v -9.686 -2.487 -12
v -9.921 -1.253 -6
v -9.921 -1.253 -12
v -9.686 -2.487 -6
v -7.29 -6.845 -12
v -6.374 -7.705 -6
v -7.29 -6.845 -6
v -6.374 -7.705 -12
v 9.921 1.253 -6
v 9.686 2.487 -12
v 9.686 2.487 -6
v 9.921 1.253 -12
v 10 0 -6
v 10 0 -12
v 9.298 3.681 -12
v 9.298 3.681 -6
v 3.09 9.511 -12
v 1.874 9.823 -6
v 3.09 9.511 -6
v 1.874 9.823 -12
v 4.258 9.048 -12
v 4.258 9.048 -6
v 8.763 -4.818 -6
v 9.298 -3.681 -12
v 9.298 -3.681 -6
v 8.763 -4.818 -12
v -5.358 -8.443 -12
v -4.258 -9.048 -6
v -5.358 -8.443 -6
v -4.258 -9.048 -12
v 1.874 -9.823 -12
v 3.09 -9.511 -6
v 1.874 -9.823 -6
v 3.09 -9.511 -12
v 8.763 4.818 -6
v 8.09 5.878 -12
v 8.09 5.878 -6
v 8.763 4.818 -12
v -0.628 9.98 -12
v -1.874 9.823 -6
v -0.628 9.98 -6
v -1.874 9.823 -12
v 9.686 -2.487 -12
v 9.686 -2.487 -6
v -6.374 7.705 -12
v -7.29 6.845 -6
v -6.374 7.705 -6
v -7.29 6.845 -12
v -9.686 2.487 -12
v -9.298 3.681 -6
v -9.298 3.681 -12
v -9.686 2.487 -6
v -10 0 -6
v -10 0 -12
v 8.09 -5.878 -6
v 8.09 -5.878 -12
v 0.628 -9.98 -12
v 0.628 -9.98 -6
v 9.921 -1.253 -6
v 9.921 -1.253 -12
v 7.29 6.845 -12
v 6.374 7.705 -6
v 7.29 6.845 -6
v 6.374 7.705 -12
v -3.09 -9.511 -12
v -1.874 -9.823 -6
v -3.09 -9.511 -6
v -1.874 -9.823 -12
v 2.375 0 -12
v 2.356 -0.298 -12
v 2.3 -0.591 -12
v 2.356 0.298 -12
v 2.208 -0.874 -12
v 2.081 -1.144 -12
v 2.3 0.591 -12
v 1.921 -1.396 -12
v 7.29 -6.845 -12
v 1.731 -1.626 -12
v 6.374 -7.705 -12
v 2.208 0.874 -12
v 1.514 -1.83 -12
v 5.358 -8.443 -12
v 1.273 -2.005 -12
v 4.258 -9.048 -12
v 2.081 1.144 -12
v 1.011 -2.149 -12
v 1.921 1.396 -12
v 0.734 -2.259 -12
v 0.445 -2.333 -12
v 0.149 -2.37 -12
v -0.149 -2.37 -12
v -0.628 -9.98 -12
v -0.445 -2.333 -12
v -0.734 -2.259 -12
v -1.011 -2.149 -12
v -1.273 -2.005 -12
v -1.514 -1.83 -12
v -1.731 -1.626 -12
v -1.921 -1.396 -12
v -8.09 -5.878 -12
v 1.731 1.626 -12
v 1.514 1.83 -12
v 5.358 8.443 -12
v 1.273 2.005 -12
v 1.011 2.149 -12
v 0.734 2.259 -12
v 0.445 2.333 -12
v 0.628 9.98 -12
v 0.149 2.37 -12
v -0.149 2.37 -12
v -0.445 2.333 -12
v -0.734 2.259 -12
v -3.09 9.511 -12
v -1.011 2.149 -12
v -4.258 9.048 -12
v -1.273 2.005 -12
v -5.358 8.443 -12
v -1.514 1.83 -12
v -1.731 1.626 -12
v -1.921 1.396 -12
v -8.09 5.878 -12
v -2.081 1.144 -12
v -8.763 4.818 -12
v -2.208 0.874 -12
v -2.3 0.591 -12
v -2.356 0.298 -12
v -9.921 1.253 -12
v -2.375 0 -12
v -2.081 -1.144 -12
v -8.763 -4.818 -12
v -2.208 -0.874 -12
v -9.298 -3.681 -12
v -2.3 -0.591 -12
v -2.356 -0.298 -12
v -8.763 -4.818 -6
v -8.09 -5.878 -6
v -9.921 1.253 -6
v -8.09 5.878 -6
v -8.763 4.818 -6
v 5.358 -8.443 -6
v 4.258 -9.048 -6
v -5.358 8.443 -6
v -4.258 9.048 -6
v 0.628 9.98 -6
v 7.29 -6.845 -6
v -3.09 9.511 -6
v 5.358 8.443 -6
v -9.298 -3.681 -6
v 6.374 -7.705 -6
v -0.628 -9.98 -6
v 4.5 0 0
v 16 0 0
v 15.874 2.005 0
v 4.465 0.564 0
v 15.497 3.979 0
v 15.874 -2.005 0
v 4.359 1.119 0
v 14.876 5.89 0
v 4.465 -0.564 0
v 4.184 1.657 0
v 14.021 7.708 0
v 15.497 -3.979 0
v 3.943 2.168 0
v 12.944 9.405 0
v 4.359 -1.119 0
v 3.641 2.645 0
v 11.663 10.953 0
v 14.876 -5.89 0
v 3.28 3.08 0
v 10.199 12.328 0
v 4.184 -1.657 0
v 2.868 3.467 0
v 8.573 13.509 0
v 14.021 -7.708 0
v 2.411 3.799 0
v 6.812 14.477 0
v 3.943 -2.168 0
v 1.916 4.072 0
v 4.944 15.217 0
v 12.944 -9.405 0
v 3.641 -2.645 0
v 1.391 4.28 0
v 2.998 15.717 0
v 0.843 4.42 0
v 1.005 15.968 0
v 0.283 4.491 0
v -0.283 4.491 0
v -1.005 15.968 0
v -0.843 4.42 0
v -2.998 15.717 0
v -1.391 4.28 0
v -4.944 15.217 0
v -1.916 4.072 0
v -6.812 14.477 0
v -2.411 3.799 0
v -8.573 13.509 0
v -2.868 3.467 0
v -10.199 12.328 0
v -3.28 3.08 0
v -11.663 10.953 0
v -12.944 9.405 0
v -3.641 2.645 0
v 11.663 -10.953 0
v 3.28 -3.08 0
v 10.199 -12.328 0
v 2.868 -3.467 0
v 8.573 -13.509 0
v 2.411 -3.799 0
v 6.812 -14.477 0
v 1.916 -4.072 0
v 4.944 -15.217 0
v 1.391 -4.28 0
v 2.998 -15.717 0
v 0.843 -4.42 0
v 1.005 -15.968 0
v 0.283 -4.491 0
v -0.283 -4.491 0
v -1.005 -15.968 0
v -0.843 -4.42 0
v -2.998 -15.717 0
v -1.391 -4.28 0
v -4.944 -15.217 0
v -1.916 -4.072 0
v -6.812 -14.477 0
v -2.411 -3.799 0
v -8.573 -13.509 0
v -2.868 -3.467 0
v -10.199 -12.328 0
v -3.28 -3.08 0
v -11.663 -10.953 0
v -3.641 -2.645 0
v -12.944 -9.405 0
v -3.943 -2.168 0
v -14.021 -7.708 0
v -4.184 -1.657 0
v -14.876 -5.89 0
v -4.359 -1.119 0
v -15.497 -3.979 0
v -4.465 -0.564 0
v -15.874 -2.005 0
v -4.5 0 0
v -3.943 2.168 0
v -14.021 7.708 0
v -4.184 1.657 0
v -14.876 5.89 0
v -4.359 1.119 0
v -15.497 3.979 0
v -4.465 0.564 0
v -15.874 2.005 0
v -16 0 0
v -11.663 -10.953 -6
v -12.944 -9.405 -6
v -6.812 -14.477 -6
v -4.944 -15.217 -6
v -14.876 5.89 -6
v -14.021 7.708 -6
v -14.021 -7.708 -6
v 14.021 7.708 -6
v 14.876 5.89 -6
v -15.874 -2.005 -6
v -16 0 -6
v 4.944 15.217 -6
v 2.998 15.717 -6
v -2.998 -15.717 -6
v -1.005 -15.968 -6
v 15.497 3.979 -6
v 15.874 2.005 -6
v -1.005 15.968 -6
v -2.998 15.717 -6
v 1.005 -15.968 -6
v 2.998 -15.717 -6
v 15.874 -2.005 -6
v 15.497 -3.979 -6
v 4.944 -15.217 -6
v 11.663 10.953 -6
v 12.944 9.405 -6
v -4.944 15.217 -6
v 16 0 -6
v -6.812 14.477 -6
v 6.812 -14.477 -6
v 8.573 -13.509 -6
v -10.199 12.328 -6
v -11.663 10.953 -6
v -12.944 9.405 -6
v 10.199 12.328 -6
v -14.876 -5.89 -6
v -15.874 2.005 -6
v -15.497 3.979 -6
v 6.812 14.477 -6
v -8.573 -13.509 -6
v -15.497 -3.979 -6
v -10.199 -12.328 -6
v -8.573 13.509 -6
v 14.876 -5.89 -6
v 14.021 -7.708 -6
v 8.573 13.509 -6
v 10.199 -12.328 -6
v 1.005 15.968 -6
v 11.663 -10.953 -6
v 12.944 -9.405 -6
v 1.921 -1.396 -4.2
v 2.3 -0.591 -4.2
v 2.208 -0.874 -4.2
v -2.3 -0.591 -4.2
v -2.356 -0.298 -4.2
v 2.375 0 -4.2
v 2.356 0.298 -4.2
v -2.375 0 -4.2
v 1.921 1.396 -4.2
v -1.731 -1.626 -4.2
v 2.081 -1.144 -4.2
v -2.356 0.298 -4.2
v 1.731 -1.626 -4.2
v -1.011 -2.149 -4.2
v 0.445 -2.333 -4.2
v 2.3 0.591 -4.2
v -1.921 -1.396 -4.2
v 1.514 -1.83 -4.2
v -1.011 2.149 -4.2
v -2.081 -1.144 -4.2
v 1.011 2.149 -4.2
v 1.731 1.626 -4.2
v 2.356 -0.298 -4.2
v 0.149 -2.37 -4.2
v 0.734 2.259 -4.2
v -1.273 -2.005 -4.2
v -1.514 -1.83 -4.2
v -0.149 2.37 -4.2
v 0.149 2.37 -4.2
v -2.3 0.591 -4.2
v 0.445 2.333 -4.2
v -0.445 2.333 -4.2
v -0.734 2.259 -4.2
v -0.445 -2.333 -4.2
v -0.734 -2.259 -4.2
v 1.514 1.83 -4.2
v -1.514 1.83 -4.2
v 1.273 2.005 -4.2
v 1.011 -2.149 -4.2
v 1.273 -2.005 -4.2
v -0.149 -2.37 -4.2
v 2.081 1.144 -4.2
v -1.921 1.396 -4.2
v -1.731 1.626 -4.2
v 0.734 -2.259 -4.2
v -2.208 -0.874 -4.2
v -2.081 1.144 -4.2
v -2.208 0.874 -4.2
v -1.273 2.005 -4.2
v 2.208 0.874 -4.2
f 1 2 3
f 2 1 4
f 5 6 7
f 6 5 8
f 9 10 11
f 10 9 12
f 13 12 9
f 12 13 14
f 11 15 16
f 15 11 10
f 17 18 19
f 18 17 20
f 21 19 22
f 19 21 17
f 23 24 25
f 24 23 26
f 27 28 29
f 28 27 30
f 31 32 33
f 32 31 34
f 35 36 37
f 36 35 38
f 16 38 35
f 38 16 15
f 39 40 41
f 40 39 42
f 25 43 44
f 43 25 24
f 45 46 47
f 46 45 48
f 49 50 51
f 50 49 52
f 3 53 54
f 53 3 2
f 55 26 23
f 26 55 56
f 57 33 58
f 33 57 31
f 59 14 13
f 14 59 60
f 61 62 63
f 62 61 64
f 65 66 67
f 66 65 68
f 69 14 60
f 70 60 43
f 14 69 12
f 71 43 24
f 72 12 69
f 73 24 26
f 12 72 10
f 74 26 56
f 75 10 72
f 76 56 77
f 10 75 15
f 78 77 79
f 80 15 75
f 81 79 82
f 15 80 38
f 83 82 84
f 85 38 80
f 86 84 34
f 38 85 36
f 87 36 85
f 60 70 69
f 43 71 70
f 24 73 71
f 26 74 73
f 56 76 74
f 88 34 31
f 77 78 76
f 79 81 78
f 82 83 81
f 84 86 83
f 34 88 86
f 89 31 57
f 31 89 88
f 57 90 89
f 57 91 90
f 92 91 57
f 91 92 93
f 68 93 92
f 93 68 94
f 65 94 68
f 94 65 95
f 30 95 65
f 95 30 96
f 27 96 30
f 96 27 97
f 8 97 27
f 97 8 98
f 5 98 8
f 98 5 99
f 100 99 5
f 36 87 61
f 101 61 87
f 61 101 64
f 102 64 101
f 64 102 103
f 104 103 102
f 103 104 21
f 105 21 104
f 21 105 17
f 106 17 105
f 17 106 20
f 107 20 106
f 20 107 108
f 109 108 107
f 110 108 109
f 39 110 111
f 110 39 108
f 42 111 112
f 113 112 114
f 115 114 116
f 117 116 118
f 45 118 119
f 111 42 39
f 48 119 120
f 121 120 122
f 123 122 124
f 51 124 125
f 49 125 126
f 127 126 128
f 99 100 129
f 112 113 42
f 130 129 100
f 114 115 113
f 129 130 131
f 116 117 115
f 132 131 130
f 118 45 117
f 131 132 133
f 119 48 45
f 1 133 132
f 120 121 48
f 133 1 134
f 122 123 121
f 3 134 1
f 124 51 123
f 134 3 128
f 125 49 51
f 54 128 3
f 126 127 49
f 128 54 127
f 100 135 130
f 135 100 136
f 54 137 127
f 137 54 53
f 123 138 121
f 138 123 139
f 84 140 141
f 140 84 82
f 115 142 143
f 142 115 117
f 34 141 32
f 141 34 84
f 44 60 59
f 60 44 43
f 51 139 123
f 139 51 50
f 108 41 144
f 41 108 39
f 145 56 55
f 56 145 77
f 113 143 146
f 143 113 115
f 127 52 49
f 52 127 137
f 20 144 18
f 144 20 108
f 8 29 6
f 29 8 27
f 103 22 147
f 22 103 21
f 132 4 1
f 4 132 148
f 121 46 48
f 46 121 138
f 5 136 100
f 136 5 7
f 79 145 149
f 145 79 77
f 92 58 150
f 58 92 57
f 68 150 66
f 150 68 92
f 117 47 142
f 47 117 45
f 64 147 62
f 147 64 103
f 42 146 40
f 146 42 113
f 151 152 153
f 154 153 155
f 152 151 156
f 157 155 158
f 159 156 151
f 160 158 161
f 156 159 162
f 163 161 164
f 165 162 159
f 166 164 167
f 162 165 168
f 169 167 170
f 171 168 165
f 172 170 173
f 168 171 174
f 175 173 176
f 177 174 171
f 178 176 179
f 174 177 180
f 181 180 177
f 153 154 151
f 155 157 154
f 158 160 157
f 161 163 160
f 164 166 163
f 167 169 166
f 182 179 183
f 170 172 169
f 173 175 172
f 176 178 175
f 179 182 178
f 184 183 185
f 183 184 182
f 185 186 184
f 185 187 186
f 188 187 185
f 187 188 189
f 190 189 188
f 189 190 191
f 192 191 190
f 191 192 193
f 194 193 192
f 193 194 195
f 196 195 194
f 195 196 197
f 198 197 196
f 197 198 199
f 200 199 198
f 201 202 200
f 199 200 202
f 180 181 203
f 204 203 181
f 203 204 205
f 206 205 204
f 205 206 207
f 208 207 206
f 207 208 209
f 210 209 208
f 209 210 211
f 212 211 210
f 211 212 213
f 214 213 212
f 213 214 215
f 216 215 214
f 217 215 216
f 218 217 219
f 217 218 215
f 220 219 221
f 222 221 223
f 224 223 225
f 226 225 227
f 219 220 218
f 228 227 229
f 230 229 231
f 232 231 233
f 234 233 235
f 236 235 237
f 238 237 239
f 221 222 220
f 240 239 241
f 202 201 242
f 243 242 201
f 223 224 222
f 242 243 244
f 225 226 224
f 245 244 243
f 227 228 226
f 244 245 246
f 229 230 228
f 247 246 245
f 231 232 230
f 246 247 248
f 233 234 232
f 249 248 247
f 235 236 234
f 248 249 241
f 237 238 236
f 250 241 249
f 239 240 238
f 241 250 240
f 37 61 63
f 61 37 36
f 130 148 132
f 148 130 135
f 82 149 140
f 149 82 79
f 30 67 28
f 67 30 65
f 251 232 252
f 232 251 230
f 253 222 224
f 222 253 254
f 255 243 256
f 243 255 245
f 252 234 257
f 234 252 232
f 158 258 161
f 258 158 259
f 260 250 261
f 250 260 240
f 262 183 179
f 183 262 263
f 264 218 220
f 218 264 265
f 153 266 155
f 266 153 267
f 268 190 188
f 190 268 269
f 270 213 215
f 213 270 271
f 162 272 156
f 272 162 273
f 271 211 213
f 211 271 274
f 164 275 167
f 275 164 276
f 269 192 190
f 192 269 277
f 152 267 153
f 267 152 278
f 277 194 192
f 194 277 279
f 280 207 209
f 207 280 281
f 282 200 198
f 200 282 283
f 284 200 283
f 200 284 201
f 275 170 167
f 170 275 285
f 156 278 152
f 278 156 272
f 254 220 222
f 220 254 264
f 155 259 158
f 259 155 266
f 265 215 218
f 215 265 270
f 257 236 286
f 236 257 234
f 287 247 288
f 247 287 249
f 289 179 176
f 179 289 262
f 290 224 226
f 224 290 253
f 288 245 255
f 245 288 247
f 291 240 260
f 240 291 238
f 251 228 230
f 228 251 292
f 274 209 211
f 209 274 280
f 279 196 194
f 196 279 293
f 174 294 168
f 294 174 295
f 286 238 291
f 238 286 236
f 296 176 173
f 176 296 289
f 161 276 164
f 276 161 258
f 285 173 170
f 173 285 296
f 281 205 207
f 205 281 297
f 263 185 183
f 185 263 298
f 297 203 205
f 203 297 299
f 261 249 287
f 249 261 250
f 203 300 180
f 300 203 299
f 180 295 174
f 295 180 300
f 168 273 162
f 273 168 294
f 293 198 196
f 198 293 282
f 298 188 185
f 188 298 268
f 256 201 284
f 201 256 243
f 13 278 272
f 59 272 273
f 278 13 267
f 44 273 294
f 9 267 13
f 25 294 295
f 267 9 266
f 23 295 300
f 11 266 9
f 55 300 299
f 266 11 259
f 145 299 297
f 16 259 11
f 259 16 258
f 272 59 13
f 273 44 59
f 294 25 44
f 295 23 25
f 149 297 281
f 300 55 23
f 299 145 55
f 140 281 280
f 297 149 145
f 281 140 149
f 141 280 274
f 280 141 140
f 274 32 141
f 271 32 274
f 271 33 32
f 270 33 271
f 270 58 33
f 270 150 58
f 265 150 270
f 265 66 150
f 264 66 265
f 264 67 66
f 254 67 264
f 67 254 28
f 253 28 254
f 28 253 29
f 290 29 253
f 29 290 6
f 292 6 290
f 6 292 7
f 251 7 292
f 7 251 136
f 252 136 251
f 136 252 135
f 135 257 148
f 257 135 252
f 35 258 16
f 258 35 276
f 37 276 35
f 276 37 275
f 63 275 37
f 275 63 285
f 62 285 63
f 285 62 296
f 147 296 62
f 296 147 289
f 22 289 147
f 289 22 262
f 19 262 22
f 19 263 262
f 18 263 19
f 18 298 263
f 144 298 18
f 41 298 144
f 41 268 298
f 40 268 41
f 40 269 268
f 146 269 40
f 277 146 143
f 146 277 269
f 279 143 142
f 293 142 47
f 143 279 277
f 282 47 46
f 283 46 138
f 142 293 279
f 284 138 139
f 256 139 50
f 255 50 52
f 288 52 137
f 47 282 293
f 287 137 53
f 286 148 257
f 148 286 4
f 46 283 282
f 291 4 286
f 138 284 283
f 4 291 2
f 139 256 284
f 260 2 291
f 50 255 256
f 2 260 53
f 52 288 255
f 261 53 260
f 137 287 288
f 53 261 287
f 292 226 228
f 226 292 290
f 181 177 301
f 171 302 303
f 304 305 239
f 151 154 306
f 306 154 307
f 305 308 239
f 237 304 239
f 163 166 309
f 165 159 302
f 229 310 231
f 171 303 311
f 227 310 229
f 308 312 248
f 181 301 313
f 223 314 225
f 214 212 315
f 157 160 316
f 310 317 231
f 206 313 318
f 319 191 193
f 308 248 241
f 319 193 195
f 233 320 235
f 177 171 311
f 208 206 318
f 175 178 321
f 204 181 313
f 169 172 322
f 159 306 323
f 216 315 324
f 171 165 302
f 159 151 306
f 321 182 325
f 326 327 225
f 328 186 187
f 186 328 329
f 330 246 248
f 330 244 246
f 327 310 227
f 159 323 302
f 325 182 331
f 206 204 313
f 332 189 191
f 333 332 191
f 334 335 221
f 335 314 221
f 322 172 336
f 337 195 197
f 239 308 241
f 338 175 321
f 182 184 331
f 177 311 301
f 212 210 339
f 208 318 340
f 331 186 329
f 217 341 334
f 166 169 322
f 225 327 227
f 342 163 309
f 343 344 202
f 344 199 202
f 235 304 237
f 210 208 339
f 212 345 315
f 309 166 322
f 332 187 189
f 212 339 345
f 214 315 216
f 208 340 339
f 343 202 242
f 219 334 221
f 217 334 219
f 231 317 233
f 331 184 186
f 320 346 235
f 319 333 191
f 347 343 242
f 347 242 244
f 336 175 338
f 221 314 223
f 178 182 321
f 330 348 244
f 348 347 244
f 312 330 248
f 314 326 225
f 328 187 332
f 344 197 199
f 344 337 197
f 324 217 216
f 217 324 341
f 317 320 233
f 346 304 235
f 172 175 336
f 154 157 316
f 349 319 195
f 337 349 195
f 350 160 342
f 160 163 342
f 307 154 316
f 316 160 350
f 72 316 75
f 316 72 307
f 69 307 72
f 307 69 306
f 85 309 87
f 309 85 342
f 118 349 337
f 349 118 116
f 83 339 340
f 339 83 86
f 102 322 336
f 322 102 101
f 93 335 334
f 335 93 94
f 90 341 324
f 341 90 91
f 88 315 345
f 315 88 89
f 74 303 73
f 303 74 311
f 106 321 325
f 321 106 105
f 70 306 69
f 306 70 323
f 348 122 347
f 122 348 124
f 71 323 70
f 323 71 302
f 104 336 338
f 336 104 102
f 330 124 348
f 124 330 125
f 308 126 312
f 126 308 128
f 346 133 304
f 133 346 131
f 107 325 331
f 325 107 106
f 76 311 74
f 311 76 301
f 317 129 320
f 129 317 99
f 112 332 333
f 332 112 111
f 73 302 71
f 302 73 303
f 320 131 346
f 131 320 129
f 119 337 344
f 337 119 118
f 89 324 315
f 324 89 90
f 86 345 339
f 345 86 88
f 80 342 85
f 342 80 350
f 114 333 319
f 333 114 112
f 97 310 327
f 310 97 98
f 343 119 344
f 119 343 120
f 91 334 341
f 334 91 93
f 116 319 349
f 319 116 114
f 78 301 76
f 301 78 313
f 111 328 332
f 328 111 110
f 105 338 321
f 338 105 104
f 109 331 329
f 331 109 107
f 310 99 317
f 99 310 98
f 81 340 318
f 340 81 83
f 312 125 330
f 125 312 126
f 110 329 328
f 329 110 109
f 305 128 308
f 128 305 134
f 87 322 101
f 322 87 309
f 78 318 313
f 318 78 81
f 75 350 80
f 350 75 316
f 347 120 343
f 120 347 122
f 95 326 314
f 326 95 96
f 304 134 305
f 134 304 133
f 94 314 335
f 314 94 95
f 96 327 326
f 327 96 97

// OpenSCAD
$fn = 50;


difference() {
	union() {
		translate(v = [0, 0, -12.0000000000]) {
			cylinder(h = 12, r = 10.0000000000);
		}
		translate(v = [0, 0, -6.0000000000]) {
			cylinder(h = 6, r = 16.0000000000);
		}
	}
	union() {
		translate(v = [0, 0, 0]) {
			rotate(a = [0, 0, 0]) {
				difference() {
					union() {
						#translate(v = [0, 0, -12.0000000000]) {
							cylinder(h = 12, r = 2.2500000000);
						}
						#translate(v = [0, 0, -4.2000000000]) {
							cylinder(h = 4.2000000000, r1 = 2.3750000000, r2 = 4.5000000000);
						}
						#translate(v = [0, 0, -12.0000000000]) {
							cylinder(h = 12, r = 2.3750000000);
						}
						#translate(v = [0, 0, -12.0000000000]) {
							cylinder(h = 12, r = 2.2500000000);
						}
					}
					union();
				}
			}
		}
	}
}
